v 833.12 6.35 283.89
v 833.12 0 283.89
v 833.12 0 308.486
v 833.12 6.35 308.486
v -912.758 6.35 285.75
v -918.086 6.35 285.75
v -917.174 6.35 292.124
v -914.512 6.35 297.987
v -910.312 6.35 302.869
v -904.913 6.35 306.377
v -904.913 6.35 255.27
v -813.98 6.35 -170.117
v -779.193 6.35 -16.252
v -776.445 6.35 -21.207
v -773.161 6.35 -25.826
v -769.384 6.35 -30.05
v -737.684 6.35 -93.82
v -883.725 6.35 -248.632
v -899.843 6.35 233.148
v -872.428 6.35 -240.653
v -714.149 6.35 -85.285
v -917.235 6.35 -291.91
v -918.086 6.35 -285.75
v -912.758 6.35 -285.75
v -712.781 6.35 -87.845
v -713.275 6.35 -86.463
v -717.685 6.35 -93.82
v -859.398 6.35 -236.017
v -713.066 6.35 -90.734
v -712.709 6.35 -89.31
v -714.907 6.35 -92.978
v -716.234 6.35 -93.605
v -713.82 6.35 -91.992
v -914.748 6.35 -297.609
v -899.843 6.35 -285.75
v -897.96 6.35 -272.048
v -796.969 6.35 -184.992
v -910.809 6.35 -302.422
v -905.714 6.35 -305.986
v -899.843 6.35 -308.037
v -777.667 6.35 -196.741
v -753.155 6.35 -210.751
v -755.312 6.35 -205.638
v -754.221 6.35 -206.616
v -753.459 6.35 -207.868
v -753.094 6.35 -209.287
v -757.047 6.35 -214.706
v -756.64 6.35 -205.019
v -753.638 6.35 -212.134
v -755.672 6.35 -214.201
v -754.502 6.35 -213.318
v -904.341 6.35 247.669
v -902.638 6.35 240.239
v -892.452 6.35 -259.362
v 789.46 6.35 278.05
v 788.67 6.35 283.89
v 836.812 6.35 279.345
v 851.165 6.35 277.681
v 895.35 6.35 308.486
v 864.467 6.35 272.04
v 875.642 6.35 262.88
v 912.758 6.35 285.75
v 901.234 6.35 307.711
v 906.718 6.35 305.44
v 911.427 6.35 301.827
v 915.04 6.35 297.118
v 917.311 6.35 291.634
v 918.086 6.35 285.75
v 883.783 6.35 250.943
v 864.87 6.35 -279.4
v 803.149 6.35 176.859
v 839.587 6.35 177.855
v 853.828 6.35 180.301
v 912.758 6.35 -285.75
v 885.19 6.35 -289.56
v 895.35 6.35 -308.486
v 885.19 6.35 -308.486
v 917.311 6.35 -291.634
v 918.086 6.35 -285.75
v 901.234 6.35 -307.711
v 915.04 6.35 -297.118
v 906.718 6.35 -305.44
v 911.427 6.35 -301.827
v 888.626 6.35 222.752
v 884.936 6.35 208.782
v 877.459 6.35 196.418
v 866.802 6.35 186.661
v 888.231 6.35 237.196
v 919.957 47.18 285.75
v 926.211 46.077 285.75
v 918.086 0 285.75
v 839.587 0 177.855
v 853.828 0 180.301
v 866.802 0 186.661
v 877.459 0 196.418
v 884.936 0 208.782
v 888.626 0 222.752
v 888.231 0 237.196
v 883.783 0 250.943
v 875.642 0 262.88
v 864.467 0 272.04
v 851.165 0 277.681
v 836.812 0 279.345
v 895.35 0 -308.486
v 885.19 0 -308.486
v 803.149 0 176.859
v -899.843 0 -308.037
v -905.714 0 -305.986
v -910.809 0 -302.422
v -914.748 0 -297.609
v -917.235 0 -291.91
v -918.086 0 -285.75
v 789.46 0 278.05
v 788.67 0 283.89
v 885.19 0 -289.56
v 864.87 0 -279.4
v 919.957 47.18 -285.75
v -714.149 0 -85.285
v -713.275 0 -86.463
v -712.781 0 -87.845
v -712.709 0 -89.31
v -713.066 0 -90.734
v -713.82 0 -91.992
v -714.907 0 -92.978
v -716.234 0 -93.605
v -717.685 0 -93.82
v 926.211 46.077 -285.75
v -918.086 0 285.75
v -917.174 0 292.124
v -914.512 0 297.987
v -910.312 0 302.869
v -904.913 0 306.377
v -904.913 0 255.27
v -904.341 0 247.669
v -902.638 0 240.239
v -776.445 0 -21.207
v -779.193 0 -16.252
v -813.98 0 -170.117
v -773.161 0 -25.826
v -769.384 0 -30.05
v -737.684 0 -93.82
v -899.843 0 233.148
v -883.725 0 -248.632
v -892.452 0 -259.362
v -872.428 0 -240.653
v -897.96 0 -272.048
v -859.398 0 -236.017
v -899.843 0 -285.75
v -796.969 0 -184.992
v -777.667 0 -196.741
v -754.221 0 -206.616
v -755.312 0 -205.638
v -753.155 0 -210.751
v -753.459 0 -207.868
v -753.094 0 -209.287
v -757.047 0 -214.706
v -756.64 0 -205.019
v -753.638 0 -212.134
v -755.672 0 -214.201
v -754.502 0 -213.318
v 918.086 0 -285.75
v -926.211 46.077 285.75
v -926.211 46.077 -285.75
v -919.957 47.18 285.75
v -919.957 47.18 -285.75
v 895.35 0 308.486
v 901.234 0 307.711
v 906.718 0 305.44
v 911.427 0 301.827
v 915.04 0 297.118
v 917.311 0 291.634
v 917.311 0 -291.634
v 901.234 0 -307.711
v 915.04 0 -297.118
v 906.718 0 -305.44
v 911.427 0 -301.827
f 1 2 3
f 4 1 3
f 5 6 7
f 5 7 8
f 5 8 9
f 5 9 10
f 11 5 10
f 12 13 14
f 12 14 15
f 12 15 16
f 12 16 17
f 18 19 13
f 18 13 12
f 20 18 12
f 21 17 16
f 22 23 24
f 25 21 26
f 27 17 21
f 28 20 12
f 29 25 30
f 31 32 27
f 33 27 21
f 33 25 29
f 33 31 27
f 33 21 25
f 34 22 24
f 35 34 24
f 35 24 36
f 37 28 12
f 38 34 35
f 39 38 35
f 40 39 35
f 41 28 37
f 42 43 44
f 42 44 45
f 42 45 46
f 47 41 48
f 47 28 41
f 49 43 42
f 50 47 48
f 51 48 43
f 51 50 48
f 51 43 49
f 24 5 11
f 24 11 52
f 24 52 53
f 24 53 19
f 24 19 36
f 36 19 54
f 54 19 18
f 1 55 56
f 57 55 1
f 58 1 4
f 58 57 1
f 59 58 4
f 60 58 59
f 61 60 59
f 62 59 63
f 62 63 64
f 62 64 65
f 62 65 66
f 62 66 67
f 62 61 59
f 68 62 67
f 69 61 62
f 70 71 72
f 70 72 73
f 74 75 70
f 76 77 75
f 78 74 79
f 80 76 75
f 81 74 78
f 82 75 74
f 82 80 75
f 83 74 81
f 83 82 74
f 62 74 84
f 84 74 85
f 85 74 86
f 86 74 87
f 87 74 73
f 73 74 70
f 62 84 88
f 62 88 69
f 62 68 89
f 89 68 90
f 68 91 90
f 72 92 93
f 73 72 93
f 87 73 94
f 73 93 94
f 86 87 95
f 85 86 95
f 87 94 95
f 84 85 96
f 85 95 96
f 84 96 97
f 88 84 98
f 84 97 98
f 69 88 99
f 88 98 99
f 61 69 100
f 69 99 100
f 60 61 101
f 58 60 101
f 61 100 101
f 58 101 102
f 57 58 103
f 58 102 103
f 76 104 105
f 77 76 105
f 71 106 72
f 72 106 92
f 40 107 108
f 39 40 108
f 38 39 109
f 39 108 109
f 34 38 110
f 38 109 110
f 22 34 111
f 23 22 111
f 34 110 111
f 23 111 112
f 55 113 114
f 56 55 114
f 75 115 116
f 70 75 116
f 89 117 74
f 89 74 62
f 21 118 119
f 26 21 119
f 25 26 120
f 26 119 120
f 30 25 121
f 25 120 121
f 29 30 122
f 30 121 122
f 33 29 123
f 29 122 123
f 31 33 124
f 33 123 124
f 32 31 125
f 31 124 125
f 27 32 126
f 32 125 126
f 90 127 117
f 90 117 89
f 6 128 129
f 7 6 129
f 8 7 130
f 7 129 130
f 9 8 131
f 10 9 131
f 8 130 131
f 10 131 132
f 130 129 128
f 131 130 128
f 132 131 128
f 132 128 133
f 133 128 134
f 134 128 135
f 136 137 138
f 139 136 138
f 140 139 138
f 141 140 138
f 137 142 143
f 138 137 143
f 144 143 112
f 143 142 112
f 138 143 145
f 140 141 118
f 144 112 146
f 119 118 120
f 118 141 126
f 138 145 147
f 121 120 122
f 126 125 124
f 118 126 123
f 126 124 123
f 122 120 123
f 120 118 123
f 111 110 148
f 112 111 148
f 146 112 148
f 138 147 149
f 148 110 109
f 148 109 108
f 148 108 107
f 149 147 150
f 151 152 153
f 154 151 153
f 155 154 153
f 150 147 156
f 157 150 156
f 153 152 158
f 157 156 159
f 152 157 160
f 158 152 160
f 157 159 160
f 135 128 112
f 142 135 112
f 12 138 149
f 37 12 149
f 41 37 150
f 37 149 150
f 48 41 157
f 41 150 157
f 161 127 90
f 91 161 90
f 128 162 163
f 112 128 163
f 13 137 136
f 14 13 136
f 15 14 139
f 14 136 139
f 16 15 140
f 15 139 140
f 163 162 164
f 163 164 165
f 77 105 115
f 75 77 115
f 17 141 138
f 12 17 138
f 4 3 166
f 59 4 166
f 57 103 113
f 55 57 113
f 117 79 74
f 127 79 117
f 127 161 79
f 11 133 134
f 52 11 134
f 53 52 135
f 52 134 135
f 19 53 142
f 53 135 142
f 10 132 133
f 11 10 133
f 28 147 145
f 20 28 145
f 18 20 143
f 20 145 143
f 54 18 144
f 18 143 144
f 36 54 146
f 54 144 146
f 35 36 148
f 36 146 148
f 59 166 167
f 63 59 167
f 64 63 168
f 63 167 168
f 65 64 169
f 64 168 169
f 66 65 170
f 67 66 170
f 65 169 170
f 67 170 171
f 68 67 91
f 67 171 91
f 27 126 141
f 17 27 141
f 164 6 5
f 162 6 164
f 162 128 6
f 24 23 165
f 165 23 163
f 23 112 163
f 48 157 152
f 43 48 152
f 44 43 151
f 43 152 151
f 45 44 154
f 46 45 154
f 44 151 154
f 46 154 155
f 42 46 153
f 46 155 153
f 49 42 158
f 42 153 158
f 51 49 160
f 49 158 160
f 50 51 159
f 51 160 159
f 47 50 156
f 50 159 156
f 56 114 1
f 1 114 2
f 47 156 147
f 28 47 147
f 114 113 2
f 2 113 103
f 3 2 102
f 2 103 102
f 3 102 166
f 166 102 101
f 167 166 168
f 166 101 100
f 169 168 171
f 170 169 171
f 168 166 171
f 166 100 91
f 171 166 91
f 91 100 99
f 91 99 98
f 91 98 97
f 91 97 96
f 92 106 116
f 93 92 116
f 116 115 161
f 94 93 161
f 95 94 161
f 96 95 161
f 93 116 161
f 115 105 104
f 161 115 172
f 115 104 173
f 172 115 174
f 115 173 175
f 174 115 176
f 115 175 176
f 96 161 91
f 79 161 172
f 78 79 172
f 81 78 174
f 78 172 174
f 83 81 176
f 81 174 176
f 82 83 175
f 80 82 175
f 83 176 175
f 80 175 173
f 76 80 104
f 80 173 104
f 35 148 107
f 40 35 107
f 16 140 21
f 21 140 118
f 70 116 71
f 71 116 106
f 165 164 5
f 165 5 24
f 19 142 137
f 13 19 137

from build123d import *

# Parameters (mm, degrees)
BOSS_EXTRUDE1_DEPTH   = 6.35
BOSS_EXTRUDE1_2_DEPTH = 6.35
SKETCH2_W             = 571.5
SKETCH2_H             = 46.788217492
BOSS_EXTRUDE2_DEPTH   = 6.35
SKETCH3_W             = 571.5
SKETCH3_H             = 46.788217492
BOSS_EXTRUDE3_DEPTH   = 6.35


with BuildPart() as part:
    # Sketch1 → Boss-Extrude1 (new body)
    with BuildSketch(Plane(origin=(0, 0, 0), x_dir=(1, 0, 0), z_dir=(0, 1, 0))):
        with BuildLine():
            Line((918.085858671, -285.75), (918.085858671, 285.75))
            ThreePointArc((918.085858671, 285.75), (911.426679842, 301.826679842), (895.35, 308.485858671))
            Line((895.35, 308.485858671), (885.19, 308.485858671))
            Line((885.19, 308.485858671), (885.19, 289.56))
            Line((885.19, 289.56), (864.87, 279.4))
            Line((864.87, 279.4), (803.148852568, -176.858594457))
            Line((803.148852568, -176.858594457), (839.587388975, -177.854835662))
            ThreePointArc((839.587388975, -177.854835662), (888.945151826, -229.987846529), (836.811695918, -279.34513931))
            Line((836.811695918, -279.34513931), (789.460059122, -278.049675912))
            Line((789.460059122, -278.049675912), (788.67, -283.889996122))
            Line((788.67, -283.889996122), (833.12, -283.889996122))
            Line((833.12, -283.889996122), (833.12, -308.485858671))
            Line((833.12, -308.485858671), (895.35, -308.485858671))
            ThreePointArc((895.35, -308.485858671), (911.426679842, -301.826679842), (918.085858671, -285.75))
        make_face()
    extrude(amount=BOSS_EXTRUDE1_DEPTH)

    # Sketch3 → Boss-Extrude3 (add)
    with BuildSketch(Plane(origin=(890.402182656, -157.001928484, 0), x_dir=(0, 0, 1), z_dir=(-0.9848077530122081, 0.17364817766693072, 0))):
        with Locations((0, 182.818045046)):
            Rectangle(SKETCH3_W, SKETCH3_H)
    extrude(amount=BOSS_EXTRUDE3_DEPTH)


with BuildPart() as body_2:
    # Sketch1 → Boss-Extrude1 2 (new body)
    with BuildSketch(Plane(origin=(0, 0, 0), x_dir=(1, 0, 0), z_dir=(0, 1, 0))):
        with BuildLine():
            Line((-918.085858671, 285.75), (-918.085858671, -285.75))
            ThreePointArc((-918.085858671, -285.75), (-914.511728847, -297.987132715), (-904.913062406, -306.376854024))
            Line((-904.913062406, -306.376854024), (-904.913062406, -255.27))
            ThreePointArc((-904.913062406, -255.27), (-903.629350189, -243.921993823), (-899.843092163, -233.147514188))
            Line((-899.843092163, -233.147514188), (-779.193092163, 16.251587569))
            ThreePointArc((-779.193092163, 16.251587569), (-774.867453261, 23.562355365), (-769.384086891, 30.050126241))
            Line((-769.384086891, 30.050126241), (-714.14942221, 85.284790922))
            ThreePointArc((-714.14942221, 85.284790922), (-713.065558454, 90.733741989), (-717.684956116, 93.820324827))
            Line((-717.684956116, 93.820324827), (-737.683726269, 93.820324827))
            Line((-737.683726269, 93.820324827), (-813.980179417, 170.116777976))
            ThreePointArc((-813.980179417, 170.116777976), (-787.570356374, 191.280977084), (-756.640276937, 205.018963219))
            ThreePointArc((-756.640276937, 205.018963219), (-753.070575733, 210.021070937), (-757.046996385, 214.706359307))
            Line((-757.046996385, 214.706359307), (-859.397945134, 236.016540238))
            ThreePointArc((-859.397945134, 236.016540238), (-888.455441312, 253.698373918), (-899.843092163, 285.75))
            Line((-899.843092163, 285.75), (-899.843092163, 308.037471645))
            ThreePointArc((-899.843092163, 308.037471645), (-912.943657634, 300.150780554), (-918.085858671, 285.75))
        make_face()
    extrude(amount=BOSS_EXTRUDE1_2_DEPTH)

    # Sketch2 → Boss-Extrude2 (add)
    with BuildSketch(Plane(origin=(-890.402182656, -157.001928484, 0), x_dir=(0, 0, -1), z_dir=(0.9848077530122081, 0.17364817766693072, 0))):
        with Locations((0, 182.818045046)):
            Rectangle(SKETCH2_W, SKETCH2_H)
    extrude(amount=BOSS_EXTRUDE2_DEPTH)


solid = Compound([part.part, body_2.part])
